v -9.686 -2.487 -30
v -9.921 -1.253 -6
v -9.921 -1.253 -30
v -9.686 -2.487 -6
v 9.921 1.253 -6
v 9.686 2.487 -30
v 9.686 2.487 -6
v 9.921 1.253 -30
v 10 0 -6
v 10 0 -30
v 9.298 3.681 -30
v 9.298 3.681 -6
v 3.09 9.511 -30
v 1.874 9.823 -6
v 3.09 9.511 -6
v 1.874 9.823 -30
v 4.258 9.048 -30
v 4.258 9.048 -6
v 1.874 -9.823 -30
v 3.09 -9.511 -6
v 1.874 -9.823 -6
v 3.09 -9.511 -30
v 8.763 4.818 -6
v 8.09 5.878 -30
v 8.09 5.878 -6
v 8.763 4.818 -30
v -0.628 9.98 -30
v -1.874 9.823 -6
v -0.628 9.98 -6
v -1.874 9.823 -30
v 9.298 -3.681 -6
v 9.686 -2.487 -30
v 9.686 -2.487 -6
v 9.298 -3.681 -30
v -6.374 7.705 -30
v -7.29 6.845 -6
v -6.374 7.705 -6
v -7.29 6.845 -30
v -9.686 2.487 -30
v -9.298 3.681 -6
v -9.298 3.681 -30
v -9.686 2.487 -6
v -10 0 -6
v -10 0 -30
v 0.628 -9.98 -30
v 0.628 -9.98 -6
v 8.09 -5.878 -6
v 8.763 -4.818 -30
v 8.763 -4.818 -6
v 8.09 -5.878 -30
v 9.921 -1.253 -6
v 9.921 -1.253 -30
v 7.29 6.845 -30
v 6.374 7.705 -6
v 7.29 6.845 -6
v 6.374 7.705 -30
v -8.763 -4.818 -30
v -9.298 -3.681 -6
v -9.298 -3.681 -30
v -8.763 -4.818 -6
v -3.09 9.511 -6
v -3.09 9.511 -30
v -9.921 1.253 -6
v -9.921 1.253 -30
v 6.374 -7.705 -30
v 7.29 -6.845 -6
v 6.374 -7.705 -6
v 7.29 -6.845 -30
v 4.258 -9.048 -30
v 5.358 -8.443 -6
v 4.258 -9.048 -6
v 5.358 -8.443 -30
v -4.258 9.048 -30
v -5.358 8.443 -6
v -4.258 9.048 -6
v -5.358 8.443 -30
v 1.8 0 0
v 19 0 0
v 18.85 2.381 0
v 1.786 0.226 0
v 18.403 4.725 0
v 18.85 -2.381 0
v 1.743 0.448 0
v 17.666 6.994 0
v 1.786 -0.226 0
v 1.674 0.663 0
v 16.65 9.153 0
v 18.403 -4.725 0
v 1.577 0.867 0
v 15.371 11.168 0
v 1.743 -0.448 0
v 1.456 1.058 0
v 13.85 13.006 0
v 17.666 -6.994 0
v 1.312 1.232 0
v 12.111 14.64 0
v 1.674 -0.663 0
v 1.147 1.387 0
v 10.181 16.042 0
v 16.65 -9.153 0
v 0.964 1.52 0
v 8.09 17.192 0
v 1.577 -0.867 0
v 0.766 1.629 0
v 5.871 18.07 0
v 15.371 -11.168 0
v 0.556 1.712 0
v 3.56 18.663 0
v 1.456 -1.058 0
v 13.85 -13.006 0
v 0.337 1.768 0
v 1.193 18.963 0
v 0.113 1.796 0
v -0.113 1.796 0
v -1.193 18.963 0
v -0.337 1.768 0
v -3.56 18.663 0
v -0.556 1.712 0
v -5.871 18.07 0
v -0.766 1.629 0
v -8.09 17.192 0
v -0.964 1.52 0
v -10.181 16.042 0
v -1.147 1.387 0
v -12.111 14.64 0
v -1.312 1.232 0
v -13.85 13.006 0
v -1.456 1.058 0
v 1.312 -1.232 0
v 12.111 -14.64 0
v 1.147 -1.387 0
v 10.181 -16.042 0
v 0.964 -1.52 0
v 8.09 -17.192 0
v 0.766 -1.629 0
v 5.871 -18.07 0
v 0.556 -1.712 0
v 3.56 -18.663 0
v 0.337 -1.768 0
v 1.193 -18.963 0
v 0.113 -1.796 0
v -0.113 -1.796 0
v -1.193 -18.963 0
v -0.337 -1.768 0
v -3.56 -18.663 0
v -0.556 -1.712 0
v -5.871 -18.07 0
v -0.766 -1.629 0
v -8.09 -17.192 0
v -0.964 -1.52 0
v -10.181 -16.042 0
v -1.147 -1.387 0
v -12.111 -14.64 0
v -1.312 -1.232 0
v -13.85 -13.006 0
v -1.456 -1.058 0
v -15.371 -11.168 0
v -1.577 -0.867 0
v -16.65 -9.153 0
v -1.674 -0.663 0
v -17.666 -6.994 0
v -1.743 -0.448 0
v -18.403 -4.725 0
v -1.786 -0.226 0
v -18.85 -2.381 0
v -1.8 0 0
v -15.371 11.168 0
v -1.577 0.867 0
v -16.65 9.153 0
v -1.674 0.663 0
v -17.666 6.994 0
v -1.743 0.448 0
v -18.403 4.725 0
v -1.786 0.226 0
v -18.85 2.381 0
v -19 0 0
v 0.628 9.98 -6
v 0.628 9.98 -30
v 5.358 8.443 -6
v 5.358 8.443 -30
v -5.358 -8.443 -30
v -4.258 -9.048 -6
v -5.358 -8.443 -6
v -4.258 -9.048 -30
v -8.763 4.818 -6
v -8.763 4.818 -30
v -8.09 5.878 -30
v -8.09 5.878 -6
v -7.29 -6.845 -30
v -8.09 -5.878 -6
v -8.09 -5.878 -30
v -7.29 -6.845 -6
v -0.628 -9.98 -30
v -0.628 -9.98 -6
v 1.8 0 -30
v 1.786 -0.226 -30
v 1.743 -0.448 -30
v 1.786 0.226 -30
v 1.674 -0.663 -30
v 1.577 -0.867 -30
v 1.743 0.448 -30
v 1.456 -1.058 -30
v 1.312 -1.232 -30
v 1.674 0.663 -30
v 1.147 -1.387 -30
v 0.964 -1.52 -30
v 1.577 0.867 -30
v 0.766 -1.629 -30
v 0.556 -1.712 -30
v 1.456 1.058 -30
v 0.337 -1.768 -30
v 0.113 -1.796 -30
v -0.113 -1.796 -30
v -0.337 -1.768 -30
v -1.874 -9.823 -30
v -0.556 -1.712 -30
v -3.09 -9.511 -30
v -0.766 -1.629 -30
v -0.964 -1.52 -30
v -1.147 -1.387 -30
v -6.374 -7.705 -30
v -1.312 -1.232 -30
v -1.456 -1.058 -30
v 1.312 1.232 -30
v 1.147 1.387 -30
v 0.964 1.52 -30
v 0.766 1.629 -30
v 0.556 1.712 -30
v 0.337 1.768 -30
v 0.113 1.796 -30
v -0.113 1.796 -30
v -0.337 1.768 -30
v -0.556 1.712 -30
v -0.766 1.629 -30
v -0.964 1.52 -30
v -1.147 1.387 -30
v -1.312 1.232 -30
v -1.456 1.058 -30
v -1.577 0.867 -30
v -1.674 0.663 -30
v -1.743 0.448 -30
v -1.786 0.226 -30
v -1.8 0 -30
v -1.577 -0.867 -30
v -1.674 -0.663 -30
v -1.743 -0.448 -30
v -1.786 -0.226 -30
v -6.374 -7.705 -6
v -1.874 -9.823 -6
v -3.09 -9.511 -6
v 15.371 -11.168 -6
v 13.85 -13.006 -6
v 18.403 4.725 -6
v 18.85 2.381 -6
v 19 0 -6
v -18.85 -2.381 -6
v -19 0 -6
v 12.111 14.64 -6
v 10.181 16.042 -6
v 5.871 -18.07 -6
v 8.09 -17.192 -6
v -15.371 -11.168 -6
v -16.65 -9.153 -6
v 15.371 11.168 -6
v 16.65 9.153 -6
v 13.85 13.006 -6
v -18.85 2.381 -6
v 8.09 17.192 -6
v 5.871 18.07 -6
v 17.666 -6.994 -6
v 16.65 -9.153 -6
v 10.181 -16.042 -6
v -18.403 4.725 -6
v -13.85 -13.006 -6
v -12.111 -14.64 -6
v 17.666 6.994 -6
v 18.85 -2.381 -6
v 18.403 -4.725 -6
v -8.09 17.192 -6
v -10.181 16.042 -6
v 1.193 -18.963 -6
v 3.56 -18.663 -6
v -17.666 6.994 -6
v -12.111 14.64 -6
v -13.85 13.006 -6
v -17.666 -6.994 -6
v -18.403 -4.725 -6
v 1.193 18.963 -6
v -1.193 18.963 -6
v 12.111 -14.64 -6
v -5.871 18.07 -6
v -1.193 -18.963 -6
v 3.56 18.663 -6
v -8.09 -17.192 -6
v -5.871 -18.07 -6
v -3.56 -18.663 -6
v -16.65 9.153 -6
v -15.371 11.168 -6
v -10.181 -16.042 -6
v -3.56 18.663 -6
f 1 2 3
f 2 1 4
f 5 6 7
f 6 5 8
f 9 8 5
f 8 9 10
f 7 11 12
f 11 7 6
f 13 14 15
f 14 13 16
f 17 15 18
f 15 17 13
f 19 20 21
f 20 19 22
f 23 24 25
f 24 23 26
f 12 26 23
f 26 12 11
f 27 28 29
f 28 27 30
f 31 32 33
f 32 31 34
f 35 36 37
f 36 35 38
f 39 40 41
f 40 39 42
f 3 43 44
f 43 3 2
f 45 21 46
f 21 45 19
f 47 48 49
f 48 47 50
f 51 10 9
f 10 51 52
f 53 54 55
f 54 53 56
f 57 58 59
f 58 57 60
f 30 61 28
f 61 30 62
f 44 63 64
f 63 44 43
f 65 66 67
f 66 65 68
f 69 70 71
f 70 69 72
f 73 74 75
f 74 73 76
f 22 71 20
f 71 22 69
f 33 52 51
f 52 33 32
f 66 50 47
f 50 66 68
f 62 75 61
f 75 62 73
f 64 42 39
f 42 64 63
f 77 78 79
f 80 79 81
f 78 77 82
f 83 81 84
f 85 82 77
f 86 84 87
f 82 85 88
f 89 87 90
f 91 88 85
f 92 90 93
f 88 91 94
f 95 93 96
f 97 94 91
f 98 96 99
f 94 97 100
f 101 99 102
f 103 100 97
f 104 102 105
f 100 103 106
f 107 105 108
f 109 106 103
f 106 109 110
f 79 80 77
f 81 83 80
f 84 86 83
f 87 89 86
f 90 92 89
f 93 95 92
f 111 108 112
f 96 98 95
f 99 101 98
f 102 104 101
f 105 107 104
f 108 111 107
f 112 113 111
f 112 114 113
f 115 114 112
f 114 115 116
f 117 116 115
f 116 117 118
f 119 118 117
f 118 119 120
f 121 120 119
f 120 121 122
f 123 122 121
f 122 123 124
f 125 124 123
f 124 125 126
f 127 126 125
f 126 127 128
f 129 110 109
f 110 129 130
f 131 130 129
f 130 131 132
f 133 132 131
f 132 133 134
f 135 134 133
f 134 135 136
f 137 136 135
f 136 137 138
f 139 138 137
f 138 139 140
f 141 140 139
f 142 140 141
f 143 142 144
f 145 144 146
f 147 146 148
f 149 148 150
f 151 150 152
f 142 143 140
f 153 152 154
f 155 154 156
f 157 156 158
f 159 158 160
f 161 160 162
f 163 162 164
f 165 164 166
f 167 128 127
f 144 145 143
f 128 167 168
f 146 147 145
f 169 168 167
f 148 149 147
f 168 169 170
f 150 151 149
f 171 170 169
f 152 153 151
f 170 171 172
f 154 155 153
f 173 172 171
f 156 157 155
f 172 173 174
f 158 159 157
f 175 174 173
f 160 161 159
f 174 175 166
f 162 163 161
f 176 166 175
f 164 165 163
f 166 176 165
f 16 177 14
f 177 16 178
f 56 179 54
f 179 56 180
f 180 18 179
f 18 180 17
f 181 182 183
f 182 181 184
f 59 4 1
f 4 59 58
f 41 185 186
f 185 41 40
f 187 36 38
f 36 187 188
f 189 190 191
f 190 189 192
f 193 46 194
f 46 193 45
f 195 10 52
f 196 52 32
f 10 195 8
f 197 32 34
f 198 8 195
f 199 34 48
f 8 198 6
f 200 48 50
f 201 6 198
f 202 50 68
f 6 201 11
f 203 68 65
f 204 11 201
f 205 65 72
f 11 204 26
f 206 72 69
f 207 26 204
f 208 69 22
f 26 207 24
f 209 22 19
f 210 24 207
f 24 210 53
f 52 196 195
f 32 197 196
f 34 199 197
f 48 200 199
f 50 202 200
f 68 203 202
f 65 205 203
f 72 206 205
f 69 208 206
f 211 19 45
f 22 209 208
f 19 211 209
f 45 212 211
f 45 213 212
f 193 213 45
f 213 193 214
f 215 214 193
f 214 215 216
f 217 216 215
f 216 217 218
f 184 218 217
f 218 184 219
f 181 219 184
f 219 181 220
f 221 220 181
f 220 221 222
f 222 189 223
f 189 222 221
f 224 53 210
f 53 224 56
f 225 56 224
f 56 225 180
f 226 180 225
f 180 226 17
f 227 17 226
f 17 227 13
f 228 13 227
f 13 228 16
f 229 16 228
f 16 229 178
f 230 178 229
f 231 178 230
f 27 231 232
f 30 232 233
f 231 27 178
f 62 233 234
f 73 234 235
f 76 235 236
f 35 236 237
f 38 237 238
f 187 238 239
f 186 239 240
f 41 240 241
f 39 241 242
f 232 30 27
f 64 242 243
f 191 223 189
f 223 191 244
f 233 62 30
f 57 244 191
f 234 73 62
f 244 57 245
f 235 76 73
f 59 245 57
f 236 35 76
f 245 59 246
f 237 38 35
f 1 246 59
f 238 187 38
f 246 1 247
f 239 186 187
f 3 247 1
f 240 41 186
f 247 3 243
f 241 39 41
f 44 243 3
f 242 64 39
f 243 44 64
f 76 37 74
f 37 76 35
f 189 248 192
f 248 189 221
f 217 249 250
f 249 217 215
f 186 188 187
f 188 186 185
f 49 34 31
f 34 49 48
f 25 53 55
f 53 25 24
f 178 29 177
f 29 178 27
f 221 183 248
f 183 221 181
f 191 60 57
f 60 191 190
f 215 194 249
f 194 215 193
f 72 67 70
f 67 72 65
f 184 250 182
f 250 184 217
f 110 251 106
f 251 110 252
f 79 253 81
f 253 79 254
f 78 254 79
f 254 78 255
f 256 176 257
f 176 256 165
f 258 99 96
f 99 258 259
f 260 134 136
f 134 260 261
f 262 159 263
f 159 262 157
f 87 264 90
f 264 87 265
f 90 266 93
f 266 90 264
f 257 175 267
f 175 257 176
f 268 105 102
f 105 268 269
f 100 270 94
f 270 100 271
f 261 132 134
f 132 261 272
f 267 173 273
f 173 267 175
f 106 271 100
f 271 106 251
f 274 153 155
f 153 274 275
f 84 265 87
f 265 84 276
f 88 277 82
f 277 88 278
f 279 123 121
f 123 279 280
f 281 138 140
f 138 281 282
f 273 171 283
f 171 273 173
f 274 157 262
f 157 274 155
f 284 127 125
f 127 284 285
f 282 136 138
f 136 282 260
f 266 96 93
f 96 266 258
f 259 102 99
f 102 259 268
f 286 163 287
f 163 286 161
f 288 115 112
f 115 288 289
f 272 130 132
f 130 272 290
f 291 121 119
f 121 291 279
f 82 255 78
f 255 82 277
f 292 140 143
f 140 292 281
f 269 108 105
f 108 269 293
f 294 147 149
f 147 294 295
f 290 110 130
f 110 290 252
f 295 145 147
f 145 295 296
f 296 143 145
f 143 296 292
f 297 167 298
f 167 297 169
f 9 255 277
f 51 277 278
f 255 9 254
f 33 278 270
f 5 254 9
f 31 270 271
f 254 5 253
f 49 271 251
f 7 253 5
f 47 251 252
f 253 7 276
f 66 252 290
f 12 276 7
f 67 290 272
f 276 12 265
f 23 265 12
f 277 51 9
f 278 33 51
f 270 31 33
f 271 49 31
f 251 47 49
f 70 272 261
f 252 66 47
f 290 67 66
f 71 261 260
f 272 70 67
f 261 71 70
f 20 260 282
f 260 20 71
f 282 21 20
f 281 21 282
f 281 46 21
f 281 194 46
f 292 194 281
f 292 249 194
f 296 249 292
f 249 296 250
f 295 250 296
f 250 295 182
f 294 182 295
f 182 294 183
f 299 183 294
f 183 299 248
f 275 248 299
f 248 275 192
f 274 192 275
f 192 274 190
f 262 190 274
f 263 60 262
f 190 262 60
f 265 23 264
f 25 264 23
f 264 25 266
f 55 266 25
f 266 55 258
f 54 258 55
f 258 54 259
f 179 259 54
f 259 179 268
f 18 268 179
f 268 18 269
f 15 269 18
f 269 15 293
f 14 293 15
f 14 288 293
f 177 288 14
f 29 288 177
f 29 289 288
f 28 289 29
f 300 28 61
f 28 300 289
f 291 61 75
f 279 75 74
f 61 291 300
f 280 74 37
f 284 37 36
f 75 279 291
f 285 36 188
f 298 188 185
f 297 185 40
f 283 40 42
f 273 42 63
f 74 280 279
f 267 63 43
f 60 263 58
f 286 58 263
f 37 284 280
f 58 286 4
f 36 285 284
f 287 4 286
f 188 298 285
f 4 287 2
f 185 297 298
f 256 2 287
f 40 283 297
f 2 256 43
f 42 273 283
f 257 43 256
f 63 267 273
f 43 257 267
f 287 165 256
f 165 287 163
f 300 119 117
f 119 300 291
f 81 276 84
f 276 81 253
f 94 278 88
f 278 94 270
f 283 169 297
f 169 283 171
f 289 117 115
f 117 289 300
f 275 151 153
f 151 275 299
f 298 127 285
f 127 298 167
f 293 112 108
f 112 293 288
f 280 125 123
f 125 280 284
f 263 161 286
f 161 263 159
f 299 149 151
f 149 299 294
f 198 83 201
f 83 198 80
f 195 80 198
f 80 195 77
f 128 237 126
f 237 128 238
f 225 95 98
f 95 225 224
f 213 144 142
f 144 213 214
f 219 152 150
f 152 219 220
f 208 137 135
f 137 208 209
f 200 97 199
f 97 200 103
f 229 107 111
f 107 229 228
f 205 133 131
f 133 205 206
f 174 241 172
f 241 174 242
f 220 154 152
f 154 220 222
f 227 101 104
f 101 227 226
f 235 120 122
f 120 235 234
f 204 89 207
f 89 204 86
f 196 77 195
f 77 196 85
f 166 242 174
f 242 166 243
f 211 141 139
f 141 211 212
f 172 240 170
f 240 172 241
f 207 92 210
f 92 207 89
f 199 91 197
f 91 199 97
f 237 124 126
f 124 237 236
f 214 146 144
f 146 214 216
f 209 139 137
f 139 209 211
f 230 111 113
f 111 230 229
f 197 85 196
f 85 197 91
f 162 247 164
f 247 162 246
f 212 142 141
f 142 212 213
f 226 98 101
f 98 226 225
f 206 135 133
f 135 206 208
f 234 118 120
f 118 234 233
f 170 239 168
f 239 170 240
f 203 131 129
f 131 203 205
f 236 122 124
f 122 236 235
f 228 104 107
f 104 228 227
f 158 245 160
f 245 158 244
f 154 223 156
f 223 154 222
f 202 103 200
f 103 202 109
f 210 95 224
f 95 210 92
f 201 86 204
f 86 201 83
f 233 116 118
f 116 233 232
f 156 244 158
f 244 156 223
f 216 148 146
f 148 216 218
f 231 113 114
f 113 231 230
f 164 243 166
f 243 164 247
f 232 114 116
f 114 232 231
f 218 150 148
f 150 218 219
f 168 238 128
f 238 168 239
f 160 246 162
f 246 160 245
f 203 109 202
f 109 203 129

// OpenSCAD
$fn = 50;


difference() {
	union() {
		translate(v = [0, 0, -30.0000000000]) {
			cylinder(h = 30, r = 10.0000000000);
		}
		translate(v = [0, 0, -6.0000000000]) {
			cylinder(h = 6, r = 19.0000000000);
		}
	}
	union() {
		#translate(v = [0, 0, -30]) {
			cylinder(h = 30, r = 1.8000000000);
		}
	}
}
